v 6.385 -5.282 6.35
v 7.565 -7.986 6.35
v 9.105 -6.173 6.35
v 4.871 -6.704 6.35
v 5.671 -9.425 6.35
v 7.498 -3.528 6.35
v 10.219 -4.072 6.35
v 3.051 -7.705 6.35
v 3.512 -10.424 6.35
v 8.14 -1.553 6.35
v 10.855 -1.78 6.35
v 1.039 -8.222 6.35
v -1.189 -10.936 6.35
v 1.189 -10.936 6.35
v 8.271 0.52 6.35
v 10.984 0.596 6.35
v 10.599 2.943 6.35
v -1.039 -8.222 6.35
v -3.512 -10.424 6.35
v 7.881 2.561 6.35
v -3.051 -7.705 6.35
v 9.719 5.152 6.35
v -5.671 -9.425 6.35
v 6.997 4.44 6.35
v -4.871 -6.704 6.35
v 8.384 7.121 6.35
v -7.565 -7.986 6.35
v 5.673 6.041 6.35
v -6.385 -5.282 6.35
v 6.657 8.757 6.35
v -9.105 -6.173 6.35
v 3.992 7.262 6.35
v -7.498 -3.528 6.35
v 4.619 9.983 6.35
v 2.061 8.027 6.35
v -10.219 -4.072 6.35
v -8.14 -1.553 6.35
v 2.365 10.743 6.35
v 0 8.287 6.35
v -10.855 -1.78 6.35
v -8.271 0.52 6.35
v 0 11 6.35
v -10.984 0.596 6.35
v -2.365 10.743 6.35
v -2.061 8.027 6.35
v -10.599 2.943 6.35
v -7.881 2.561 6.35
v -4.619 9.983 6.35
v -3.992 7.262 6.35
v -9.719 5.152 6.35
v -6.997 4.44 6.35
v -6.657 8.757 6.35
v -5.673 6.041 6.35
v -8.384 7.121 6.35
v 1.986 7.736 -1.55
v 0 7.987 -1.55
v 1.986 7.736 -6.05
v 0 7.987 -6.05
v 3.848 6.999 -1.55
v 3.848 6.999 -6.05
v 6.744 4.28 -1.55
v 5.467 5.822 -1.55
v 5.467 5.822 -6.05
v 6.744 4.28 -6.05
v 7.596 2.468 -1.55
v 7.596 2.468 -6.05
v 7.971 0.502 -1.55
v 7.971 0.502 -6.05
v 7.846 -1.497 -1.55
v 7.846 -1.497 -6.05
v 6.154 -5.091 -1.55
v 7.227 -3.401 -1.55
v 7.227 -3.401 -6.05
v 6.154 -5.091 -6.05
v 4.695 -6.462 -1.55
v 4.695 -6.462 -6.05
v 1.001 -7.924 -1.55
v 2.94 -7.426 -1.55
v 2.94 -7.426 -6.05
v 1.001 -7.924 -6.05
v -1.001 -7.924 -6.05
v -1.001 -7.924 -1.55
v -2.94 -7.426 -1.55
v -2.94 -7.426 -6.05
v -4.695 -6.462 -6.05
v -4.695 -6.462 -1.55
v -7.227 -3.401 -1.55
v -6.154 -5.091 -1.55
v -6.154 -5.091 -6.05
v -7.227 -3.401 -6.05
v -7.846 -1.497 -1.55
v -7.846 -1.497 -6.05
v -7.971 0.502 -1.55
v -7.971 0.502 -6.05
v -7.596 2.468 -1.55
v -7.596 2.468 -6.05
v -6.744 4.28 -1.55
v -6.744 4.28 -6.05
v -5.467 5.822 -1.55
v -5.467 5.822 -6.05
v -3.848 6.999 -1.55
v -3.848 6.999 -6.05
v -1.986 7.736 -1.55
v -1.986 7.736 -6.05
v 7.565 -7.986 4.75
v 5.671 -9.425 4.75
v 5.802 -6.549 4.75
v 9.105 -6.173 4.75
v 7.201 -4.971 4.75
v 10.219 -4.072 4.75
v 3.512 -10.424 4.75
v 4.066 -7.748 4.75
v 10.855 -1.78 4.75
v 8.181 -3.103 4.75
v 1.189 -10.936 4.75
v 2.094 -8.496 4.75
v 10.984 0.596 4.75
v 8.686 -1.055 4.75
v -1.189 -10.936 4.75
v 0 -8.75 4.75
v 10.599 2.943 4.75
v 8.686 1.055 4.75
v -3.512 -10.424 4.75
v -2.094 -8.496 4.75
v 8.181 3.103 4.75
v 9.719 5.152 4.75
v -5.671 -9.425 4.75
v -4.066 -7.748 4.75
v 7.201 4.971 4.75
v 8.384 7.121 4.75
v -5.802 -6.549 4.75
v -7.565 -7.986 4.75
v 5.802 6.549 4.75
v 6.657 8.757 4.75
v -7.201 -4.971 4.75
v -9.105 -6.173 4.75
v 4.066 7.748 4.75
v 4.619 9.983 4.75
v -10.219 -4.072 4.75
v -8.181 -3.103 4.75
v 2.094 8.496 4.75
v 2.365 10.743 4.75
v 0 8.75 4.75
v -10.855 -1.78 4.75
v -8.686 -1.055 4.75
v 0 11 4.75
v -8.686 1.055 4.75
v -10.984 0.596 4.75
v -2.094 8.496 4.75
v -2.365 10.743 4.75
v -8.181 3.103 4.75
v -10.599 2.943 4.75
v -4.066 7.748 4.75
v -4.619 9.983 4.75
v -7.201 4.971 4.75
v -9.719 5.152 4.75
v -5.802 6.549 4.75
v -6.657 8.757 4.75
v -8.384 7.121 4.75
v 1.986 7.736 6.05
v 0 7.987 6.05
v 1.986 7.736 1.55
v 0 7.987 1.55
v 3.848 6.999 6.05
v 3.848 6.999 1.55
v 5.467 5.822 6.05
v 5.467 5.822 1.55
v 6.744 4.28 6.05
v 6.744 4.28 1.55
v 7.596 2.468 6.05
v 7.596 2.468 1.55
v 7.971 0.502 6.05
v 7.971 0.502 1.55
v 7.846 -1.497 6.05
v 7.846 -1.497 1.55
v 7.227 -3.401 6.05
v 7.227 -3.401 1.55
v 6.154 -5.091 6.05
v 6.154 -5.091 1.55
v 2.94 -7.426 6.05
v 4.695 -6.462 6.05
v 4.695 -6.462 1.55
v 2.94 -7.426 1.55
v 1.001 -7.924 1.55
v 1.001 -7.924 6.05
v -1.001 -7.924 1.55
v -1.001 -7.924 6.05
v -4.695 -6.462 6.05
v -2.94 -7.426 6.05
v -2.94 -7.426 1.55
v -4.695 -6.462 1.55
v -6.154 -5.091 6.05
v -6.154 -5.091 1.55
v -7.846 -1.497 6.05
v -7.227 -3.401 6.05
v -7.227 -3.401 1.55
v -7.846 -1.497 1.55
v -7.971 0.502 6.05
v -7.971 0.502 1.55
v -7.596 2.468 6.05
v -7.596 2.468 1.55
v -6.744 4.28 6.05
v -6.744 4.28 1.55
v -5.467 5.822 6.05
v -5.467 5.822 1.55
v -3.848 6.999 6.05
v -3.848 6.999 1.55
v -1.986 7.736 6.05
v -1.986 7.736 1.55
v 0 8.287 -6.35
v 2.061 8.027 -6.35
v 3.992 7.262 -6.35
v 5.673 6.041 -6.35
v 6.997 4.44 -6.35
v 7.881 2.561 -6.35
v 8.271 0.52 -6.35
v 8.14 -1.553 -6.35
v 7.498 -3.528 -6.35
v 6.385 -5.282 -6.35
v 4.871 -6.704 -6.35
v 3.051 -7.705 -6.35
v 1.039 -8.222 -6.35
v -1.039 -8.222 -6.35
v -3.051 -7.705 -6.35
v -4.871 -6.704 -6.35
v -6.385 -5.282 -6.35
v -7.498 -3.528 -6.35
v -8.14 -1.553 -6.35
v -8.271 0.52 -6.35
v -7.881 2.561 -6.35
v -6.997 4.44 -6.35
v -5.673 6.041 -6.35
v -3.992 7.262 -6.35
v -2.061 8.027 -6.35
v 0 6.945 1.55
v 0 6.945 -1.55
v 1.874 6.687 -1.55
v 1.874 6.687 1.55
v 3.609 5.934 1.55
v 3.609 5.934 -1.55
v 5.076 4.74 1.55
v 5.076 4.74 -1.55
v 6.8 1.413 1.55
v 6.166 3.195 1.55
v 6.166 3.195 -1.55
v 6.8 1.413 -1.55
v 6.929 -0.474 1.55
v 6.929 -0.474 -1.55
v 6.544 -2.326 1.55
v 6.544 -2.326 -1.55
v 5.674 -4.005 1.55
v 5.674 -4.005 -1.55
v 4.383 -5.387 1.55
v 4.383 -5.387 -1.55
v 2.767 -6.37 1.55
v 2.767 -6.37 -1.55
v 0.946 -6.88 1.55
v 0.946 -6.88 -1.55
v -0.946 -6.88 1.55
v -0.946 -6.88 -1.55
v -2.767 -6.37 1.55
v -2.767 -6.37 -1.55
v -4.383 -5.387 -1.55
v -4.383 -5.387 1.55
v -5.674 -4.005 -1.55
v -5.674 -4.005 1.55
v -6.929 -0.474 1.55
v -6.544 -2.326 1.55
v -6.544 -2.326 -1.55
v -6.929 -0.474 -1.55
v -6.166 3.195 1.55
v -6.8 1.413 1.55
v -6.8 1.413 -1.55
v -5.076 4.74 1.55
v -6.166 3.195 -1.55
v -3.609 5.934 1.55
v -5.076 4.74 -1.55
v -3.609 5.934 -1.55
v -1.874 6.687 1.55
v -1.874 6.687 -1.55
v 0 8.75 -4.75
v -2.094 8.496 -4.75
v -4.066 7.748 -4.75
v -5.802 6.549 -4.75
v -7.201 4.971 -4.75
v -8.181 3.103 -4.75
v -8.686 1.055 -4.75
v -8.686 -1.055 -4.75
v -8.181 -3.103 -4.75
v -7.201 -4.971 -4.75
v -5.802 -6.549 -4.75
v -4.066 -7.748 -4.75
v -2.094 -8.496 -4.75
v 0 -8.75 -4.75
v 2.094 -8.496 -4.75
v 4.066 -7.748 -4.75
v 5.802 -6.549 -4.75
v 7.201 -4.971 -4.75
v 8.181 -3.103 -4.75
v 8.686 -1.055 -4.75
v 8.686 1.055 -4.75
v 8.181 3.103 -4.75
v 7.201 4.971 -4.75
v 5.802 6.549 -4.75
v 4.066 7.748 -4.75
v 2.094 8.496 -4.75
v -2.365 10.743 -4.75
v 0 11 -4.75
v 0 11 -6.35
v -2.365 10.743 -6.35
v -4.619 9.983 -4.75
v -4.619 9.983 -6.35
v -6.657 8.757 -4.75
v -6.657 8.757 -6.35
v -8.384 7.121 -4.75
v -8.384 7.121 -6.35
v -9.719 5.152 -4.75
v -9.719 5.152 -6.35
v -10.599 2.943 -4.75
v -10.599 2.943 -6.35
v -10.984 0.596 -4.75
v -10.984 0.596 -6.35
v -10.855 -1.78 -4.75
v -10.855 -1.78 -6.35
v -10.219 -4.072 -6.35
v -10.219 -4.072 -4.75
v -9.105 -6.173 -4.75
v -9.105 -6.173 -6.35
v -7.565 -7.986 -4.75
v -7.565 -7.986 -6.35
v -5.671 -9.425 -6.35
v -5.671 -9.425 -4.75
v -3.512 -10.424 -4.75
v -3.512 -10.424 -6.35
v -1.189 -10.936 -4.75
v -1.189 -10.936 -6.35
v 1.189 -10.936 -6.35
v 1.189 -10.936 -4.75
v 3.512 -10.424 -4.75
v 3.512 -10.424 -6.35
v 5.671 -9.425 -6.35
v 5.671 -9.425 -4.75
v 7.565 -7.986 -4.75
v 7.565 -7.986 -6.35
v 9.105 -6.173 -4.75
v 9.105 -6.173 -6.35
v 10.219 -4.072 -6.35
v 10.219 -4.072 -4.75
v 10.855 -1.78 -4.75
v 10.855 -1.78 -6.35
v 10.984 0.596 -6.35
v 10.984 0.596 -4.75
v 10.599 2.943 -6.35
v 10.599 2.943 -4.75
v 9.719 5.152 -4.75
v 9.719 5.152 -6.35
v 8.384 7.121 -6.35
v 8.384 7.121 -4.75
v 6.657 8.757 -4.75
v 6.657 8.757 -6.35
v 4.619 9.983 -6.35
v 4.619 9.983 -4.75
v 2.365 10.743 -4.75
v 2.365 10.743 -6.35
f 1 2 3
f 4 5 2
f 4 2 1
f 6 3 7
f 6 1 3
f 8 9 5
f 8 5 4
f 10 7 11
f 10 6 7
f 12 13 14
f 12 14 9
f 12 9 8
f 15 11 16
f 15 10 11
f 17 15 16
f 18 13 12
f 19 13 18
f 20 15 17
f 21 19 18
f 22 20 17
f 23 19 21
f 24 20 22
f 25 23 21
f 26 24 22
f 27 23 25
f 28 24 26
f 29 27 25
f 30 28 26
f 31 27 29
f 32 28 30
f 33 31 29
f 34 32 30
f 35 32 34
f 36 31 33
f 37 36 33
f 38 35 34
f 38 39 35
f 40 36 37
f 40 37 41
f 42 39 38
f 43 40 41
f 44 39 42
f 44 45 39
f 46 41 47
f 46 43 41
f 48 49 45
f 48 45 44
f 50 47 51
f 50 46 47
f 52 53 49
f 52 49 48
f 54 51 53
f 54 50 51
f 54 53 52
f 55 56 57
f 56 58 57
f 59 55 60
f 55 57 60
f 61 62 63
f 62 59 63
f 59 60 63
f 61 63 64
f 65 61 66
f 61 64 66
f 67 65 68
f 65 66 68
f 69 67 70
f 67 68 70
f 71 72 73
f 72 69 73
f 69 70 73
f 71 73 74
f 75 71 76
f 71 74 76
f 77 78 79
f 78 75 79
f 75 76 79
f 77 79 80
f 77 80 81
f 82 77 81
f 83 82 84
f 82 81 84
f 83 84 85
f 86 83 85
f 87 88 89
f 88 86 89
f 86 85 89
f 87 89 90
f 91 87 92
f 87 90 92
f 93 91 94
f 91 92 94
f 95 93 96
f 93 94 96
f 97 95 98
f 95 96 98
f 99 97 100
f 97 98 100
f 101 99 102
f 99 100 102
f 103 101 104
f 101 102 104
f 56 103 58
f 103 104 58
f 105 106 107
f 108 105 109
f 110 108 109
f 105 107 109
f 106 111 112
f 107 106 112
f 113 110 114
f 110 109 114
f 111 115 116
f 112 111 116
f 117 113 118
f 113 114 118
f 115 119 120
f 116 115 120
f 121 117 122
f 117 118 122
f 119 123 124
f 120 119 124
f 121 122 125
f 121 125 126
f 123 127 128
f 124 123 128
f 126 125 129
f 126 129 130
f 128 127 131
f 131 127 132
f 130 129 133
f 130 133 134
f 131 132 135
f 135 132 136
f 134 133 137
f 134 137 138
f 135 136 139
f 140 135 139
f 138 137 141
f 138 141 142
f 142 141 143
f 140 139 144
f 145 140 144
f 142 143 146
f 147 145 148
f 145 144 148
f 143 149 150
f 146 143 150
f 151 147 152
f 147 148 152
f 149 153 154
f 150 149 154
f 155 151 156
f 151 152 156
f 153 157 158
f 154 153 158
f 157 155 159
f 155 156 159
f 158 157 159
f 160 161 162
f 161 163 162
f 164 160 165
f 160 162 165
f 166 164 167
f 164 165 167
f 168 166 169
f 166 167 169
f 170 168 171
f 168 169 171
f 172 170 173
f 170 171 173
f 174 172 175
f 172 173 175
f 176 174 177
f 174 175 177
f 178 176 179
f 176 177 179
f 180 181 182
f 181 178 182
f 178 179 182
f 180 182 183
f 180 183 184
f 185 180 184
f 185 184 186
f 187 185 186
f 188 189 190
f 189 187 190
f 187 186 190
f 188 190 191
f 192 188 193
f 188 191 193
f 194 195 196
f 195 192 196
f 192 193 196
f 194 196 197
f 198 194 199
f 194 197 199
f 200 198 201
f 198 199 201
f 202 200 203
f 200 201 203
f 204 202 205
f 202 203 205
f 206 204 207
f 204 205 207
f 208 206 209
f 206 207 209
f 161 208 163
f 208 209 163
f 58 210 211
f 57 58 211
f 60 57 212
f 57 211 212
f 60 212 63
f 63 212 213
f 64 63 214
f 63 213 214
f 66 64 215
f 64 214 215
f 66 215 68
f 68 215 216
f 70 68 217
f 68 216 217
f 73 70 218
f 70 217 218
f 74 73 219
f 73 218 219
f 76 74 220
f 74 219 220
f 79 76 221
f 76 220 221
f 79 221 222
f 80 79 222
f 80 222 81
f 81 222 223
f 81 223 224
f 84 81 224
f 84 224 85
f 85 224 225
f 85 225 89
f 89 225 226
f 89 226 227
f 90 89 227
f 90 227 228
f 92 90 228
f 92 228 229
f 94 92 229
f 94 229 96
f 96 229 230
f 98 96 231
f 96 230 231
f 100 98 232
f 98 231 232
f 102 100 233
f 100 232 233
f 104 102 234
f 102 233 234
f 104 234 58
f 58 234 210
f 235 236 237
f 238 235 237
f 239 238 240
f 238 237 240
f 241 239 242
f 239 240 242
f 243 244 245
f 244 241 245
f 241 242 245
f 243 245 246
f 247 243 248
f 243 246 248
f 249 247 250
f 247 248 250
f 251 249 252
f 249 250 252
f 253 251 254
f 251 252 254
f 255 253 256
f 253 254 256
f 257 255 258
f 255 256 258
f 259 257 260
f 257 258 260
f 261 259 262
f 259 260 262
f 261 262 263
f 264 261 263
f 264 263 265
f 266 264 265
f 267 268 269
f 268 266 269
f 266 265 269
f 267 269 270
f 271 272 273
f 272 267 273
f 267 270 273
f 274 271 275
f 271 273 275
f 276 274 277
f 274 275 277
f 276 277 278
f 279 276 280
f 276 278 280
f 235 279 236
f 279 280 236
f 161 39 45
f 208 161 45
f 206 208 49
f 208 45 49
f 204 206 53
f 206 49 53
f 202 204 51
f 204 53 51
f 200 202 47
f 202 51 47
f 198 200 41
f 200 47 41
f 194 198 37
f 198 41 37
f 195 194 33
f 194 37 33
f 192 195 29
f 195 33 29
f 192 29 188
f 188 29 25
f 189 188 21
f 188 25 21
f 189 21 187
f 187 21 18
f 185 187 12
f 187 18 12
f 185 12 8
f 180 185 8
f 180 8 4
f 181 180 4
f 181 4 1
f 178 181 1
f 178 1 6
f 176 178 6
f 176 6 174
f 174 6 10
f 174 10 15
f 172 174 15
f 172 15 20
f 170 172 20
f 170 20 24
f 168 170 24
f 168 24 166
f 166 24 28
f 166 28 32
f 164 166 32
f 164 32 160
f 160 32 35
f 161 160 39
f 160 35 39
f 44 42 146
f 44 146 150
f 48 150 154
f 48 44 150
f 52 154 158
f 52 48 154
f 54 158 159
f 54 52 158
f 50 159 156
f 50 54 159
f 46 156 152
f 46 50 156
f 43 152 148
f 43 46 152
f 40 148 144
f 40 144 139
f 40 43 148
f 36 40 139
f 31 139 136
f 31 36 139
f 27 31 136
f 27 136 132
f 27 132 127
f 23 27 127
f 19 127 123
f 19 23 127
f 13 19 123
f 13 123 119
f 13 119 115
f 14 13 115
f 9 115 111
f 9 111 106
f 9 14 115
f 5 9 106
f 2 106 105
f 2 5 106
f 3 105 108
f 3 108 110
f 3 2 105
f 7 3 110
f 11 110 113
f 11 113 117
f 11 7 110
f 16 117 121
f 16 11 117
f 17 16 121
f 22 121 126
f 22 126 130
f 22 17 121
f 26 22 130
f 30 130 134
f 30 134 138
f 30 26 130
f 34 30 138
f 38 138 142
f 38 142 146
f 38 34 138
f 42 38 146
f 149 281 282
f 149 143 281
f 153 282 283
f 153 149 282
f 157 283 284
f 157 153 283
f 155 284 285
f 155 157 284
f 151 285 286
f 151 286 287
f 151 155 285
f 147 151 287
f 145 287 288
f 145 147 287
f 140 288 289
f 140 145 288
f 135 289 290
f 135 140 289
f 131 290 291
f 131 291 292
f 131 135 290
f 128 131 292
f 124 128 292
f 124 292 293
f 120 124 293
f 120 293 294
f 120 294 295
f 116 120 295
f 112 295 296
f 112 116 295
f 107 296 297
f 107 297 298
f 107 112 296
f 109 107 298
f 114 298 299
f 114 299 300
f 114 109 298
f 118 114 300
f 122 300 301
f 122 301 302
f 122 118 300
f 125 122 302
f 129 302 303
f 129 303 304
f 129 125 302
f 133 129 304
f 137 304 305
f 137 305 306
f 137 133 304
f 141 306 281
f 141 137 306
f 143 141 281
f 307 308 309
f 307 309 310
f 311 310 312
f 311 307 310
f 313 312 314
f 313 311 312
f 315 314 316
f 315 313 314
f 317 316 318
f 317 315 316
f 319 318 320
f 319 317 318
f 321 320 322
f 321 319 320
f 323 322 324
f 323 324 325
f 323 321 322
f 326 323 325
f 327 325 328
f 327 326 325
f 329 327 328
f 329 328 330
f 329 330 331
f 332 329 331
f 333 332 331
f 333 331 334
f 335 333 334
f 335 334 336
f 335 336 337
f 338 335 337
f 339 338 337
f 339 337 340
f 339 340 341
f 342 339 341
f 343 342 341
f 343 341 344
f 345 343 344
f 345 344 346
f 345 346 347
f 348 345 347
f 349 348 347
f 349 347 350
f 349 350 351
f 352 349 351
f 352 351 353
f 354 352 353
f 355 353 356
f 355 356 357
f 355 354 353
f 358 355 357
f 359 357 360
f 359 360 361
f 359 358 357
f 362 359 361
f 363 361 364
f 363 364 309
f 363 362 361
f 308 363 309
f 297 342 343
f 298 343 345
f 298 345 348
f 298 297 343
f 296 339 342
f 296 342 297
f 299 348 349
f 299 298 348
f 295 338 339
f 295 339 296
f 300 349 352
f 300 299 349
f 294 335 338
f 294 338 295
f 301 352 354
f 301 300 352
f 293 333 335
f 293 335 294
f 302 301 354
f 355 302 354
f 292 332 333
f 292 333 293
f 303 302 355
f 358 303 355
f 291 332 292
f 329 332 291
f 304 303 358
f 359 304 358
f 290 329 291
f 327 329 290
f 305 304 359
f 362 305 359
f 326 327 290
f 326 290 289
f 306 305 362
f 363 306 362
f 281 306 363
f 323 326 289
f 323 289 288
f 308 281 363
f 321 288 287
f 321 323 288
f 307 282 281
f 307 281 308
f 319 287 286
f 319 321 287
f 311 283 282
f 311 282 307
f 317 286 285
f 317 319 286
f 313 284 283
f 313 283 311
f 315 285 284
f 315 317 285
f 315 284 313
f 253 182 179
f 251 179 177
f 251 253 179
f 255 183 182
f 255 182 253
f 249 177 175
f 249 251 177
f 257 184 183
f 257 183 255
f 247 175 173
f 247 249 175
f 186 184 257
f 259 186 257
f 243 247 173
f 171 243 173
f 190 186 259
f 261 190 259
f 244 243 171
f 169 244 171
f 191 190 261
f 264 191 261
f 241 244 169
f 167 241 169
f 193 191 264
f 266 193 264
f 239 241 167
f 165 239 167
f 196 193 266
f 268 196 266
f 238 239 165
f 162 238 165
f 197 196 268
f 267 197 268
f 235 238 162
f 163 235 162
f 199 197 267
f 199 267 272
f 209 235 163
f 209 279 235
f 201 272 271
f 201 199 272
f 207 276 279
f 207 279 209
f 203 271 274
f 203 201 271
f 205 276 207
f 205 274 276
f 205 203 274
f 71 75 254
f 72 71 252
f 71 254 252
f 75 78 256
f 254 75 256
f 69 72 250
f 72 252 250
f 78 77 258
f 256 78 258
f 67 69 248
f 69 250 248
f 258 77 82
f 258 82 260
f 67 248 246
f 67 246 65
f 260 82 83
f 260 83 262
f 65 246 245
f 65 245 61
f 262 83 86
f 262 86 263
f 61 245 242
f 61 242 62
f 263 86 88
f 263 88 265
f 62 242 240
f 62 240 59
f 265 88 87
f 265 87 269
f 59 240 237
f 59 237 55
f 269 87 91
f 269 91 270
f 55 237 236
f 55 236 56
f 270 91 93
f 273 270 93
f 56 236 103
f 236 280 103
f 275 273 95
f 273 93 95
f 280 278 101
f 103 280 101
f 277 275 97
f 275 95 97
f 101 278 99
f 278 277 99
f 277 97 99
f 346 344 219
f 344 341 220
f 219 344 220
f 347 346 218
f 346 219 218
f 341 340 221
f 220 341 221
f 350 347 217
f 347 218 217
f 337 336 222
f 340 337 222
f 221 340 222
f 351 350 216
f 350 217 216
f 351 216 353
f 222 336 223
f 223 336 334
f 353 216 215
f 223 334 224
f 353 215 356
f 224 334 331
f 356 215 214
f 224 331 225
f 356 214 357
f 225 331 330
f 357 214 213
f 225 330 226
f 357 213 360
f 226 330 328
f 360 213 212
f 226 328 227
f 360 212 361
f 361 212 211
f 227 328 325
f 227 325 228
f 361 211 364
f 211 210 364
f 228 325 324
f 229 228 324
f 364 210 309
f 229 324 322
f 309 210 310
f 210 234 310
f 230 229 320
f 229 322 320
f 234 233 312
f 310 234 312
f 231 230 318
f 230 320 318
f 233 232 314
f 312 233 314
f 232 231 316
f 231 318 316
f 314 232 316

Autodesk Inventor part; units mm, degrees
ref_plane "YZ Plane" through (0, 0, 0) normal (1, 0, 0) x (0, 1, 0)
ref_plane "XZ Plane" through (0, 0, 0) normal (0, 1, 0) x (-1, 0, 0)
ref_plane "XY Plane" through (0, 0, 0) normal (0, 0, 1) x (1, 0, 0)
sketch "Sketch1" plane through (0, 0, 0) normal (1, 0, 0) x (0, 1, 0)
  line L0 (7.987, -6.35) -> (11, -6.35)
  line L1 (11, -6.35) -> (11, -4.75)
  line L2 (11, -4.75) -> (8.75, -4.75)
  line L3 (8.75, -4.75) -> (8.75, 4.75)
  line L4 (8.75, 4.75) -> (11, 4.75)
  line L5 (11, 4.75) -> (11, 6.35)
  line L6 (11, 6.35) -> (7.987, 6.35)
  line L7 (7.987, 6.35) -> (7.987, 1.55)
  line L8 (7.987, 1.55) -> (6.945, 1.55)
  line L9 (6.945, 1.55) -> (6.945, -1.55)
  line L10 (6.945, -1.55) -> (7.987, -1.55)
  line L11 (7.987, -1.55) -> (7.987, -6.35)
  line L12 (0, 0) -> (0, 23.3621) construction
  line L13 (6.945, 0) -> (8.75, 0) construction
  dimension "d0" = 9.5
  dimension "d1" = 15.974
  dimension "d2" = 13.89
  dimension "d3" = 3.1
  dimension "d4" = 12.7
  dimension "d5" = 17.5
  dimension "d6" = 22
revolve "Revolution1" add sketch "Sketch1" angle 360 about axis through (0, 0, 0) along (0, 0, 1)
chamfer "Chamfer1" distance 0.3 angle 45 2 edges at (0, -7.987, 6.35) (0, -7.987, -6.35)
ref_plane "Work Plane1" through (0, 0, 0) normal (0, 0, -1) x (-1, 0, 0)
properties part number "idler pulley" material "ABS Plastic"
